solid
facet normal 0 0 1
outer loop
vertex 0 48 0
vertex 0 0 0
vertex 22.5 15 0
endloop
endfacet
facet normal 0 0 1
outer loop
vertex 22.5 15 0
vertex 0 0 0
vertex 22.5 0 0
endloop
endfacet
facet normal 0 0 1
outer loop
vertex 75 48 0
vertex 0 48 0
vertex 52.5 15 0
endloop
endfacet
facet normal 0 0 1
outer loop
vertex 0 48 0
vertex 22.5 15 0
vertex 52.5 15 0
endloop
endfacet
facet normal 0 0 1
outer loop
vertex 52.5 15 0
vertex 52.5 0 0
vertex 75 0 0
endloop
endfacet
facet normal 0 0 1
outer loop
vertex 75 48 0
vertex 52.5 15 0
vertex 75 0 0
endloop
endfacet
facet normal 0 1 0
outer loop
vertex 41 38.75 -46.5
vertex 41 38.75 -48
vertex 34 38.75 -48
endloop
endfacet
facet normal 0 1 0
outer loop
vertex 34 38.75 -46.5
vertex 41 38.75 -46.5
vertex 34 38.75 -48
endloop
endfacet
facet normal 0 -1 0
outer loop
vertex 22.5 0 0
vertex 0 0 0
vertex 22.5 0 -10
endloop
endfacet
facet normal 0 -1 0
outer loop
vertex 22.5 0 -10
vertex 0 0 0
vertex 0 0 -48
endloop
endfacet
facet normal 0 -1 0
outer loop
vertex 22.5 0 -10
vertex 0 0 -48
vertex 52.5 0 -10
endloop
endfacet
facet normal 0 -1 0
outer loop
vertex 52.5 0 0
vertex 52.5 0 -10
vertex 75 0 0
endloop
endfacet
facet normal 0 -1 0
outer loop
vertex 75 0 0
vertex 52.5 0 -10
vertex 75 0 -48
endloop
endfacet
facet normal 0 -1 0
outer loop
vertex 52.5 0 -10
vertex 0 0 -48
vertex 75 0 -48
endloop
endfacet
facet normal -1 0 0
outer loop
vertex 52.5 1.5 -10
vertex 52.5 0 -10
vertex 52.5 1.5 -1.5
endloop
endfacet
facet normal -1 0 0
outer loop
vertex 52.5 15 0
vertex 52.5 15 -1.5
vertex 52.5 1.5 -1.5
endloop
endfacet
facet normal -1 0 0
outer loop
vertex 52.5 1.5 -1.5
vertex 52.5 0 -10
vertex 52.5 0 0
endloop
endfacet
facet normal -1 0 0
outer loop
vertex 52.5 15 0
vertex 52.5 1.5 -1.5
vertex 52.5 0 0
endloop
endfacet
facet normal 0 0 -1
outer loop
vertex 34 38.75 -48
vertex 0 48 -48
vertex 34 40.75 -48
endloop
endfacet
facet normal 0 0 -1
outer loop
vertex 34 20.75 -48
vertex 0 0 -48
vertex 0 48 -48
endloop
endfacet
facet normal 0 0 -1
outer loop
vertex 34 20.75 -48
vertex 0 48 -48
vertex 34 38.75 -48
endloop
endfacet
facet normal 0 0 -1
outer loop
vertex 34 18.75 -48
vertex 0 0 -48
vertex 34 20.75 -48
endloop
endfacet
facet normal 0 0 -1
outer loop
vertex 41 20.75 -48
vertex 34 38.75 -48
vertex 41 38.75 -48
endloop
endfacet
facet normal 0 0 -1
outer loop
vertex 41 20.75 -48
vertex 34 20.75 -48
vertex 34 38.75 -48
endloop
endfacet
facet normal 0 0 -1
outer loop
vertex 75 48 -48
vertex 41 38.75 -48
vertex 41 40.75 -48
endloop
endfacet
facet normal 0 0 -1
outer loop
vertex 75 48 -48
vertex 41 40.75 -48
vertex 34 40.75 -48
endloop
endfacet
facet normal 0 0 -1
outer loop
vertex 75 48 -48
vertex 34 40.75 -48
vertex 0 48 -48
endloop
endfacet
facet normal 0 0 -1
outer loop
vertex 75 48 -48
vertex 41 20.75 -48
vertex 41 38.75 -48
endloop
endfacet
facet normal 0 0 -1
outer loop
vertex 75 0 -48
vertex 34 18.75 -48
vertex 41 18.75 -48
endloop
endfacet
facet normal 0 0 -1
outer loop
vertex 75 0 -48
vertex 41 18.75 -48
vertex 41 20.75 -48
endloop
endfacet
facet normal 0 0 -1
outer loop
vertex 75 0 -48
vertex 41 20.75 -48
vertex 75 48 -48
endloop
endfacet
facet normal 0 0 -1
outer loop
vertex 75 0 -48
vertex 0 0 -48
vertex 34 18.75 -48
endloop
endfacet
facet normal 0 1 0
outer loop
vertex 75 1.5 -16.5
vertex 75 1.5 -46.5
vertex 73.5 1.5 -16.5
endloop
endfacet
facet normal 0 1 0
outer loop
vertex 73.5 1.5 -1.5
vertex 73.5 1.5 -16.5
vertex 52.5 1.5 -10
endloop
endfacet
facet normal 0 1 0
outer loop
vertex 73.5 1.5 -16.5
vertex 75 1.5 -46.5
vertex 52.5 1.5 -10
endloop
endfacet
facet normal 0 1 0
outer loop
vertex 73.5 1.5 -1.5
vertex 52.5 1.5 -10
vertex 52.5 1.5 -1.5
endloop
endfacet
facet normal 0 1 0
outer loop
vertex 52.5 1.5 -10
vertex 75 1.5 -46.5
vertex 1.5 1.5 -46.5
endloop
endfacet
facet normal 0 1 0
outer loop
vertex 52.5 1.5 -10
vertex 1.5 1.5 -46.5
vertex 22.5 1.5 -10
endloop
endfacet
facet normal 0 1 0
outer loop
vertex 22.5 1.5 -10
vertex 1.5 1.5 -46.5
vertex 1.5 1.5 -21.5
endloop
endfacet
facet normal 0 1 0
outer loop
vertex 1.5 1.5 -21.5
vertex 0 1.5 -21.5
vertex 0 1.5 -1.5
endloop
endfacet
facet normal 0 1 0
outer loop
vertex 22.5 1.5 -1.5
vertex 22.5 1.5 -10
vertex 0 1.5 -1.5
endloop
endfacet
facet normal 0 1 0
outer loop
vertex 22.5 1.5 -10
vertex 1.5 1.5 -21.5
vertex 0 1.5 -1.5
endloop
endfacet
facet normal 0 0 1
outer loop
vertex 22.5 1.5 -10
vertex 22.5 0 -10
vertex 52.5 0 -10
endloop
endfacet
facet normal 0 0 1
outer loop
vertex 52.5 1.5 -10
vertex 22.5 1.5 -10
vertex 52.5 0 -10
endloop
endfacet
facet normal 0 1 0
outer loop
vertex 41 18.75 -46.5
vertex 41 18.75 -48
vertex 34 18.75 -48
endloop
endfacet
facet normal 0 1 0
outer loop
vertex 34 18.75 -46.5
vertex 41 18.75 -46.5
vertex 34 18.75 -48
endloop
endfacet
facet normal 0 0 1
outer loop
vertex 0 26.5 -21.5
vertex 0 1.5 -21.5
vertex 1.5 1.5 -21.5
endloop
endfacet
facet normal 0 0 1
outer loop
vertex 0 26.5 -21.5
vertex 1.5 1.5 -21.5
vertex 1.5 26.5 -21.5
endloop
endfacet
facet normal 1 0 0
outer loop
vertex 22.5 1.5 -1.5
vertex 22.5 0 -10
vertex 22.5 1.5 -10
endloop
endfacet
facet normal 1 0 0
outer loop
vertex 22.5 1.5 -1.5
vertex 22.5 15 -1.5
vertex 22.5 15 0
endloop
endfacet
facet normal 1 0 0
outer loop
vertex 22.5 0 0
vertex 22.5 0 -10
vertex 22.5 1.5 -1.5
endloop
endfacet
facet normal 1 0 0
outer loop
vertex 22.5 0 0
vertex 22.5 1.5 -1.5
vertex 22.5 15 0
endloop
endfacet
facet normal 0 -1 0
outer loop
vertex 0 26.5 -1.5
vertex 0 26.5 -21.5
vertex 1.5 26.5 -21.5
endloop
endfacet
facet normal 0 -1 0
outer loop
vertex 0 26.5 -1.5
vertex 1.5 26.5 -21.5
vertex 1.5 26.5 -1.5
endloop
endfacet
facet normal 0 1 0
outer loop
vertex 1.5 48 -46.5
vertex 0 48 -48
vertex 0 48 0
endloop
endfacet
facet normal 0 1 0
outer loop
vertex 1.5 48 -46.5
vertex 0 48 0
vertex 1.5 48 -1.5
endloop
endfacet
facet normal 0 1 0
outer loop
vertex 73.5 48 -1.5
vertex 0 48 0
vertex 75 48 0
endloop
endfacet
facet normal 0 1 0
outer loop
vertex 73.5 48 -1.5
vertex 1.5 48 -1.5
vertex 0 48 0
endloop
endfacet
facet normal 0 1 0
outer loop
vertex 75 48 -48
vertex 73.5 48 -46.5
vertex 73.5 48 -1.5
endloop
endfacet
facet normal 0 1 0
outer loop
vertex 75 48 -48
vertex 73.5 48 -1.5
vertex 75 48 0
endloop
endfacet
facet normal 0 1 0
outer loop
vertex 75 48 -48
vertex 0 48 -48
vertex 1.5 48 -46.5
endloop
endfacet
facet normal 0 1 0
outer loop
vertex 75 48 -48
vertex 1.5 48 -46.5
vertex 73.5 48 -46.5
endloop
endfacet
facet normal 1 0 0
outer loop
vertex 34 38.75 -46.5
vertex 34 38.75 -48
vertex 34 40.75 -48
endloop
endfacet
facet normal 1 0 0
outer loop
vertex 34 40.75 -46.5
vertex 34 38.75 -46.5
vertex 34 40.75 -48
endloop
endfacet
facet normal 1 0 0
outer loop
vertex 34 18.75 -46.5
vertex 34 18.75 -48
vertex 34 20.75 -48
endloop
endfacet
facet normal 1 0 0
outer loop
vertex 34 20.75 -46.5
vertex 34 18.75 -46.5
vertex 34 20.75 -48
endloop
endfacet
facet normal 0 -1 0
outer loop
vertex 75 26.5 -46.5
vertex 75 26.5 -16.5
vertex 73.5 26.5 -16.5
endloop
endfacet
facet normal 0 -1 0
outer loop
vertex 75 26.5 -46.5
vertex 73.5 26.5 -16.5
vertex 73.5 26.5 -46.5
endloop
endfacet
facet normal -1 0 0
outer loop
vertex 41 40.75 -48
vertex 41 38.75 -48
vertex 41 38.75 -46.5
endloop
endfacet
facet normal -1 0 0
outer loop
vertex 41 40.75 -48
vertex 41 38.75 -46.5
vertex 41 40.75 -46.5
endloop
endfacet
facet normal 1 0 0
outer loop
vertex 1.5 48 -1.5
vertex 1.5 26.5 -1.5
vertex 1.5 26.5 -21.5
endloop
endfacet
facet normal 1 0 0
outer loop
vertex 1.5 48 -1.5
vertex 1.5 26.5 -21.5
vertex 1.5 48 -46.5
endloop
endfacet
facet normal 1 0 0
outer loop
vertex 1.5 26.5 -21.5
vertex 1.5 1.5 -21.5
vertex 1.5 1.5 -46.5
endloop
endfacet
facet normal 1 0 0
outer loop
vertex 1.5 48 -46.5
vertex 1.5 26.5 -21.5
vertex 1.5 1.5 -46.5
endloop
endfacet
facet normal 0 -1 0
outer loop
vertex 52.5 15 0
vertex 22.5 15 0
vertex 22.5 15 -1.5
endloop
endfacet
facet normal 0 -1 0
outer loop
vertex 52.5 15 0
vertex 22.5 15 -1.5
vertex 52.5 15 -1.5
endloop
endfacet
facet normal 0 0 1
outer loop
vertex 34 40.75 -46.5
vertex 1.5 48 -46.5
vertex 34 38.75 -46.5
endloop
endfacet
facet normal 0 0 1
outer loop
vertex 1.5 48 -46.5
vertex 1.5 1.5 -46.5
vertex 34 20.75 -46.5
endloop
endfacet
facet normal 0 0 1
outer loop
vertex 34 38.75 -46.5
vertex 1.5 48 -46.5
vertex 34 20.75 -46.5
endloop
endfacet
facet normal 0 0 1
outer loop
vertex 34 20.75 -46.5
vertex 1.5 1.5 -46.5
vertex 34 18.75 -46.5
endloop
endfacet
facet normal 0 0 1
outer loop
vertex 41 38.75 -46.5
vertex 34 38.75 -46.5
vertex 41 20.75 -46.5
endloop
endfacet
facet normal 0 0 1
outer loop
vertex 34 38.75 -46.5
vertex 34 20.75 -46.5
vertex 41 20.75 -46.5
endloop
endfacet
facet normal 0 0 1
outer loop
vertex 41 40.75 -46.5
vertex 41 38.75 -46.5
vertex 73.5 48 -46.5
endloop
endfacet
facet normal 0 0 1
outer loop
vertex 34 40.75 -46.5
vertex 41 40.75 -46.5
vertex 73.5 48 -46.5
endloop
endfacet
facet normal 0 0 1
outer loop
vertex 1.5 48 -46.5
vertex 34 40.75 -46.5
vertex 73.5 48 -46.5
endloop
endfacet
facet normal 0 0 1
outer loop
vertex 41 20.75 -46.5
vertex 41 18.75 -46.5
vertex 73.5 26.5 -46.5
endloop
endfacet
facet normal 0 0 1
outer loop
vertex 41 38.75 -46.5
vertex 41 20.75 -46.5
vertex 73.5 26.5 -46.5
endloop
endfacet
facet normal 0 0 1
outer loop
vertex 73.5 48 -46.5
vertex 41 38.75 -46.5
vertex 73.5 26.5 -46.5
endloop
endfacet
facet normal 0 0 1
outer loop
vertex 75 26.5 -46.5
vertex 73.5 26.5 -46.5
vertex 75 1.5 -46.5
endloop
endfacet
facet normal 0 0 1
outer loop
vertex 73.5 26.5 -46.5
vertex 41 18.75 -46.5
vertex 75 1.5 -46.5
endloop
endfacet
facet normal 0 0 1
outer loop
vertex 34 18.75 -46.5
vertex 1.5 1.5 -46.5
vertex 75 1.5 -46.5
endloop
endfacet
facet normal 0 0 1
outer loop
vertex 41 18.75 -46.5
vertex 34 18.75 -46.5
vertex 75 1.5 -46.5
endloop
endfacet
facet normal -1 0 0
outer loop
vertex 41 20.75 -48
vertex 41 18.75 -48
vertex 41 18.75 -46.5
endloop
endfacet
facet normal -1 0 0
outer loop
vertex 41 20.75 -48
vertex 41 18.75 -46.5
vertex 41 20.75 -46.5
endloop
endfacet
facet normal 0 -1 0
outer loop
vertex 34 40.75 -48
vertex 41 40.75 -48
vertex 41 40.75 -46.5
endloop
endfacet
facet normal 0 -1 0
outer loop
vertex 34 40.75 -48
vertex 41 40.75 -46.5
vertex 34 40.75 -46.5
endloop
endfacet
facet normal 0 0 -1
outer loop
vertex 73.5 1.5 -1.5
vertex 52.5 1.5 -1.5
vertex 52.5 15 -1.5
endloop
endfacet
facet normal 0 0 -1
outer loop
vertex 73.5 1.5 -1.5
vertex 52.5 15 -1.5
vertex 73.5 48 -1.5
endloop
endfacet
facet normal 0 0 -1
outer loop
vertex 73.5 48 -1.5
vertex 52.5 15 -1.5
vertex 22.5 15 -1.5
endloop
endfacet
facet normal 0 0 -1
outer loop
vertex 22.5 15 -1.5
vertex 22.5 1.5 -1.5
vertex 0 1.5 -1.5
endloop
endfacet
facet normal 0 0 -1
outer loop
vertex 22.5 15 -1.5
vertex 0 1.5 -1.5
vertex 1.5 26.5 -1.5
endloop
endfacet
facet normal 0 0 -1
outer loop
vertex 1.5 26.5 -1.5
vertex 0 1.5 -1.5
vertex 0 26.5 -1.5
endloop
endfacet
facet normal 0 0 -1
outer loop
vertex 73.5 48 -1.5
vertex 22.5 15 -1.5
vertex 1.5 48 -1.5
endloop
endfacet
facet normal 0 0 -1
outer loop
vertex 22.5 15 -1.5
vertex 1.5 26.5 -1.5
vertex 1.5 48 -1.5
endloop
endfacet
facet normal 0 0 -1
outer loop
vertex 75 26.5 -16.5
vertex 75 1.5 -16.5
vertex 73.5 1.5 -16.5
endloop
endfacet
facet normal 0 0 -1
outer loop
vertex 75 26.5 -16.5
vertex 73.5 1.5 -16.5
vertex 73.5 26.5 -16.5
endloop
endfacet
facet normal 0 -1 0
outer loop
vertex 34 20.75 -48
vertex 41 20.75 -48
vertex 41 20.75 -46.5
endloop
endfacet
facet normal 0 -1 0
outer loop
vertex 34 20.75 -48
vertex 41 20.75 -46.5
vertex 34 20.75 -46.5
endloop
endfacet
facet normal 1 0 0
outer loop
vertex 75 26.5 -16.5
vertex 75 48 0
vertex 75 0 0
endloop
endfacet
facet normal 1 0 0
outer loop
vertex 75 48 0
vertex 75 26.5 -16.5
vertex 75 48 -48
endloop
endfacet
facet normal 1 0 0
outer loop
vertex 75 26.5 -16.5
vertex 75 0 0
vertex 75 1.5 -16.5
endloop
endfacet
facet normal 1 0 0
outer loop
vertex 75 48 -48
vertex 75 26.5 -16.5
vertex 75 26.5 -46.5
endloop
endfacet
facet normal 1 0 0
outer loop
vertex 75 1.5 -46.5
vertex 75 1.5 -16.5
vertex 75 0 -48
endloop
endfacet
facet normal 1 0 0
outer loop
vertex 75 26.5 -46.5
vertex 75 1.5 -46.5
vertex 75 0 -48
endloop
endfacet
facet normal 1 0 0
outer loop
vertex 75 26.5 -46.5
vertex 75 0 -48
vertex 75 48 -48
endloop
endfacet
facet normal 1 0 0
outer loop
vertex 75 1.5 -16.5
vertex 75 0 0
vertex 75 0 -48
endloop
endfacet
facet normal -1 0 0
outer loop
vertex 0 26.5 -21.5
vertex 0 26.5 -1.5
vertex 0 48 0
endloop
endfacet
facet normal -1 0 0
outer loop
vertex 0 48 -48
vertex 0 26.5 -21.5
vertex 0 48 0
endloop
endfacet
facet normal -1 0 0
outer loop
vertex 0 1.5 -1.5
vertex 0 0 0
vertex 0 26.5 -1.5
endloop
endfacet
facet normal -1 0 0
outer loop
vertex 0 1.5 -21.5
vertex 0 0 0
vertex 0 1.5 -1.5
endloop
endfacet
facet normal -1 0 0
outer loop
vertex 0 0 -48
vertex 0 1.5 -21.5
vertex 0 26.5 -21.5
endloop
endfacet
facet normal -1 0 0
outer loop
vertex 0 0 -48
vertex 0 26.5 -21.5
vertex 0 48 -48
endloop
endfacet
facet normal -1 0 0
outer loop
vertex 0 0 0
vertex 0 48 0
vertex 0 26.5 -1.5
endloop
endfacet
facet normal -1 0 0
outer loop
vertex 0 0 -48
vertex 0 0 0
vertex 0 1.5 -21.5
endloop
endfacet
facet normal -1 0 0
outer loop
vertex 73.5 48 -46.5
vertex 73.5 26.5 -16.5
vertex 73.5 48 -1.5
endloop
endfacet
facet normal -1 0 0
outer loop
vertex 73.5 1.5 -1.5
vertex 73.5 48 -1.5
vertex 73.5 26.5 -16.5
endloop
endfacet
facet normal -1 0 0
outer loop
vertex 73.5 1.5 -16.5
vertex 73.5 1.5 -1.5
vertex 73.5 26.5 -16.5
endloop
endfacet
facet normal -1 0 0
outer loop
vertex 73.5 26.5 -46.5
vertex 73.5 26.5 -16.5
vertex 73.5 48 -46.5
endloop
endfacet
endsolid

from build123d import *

# Parameters (mm, degrees)
SKETCH1_W           = 75
SKETCH1_H           = 48
BOSS_EXTRUDE1_DEPTH = 48
SHELL1_T            = -1.5
SKETCH2_W           = 30
SKETCH2_H           = 25
CUT_EXTRUDE2_DEPTH  = 50
SKETCH3_W           = 30
SKETCH3_H           = 10
CUT_EXTRUDE3_DEPTH  = 15
SKETCH4_W           = 20
SKETCH4_H           = 25
CUT_EXTRUDE4_DEPTH  = 15
SKETCH5_W           = 7
SKETCH5_H           = 2
CUT_EXTRUDE5_DEPTH  = 15


with BuildPart() as part:
    # Sketch1 → Boss-Extrude1 (new body)
    with BuildSketch(Plane(origin=(0, 0, 0), x_dir=(1, 0, 0), z_dir=(0, 1, 0))):
        with Locations((37.5, 24)):
            Rectangle(SKETCH1_W, SKETCH1_H)
    extrude(amount=BOSS_EXTRUDE1_DEPTH)

    # Shell1
    shell1_openings = [part.faces().sort_by_distance(p)[0] for p in [
        (37.5, 48, -24),
    ]]
    offset(amount=SHELL1_T, openings=shell1_openings, kind=Kind.INTERSECTION)

    # Sketch2 → Cut-Extrude2 (cut)
    with BuildSketch(Plane(origin=(75, 0, 0), x_dir=(0, 0, -1), z_dir=(1, 0, 0))):
        with Locations((31.5, 14)):
            Rectangle(SKETCH2_W, SKETCH2_H)
    extrude(amount=-CUT_EXTRUDE2_DEPTH, mode=Mode.SUBTRACT)

    # Sketch3 → Cut-Extrude3 (cut)
    with BuildSketch(Plane.XZ):
        with Locations((37.5, -5)):
            Rectangle(SKETCH3_W, SKETCH3_H)
    extrude(amount=-CUT_EXTRUDE3_DEPTH, mode=Mode.SUBTRACT)

    # Sketch4 → Cut-Extrude4 (cut)
    with BuildSketch(Plane.ZY):
        with Locations((-11.5, 14)):
            Rectangle(SKETCH4_W, SKETCH4_H)
    extrude(amount=-CUT_EXTRUDE4_DEPTH, mode=Mode.SUBTRACT)

    # Sketch5 → Cut-Extrude5 (cut)
    with BuildSketch(Plane(origin=(0, 0, -48), x_dir=(-1, 0, 0), z_dir=(0, 0, -1))):
        with Locations((-37.5, 19.75)):
            Rectangle(SKETCH5_W, SKETCH5_H)
        with Locations((-37.5, 39.75)):
            Rectangle(SKETCH5_W, SKETCH5_H)
    extrude(amount=-CUT_EXTRUDE5_DEPTH, mode=Mode.SUBTRACT)


solid = part.part
